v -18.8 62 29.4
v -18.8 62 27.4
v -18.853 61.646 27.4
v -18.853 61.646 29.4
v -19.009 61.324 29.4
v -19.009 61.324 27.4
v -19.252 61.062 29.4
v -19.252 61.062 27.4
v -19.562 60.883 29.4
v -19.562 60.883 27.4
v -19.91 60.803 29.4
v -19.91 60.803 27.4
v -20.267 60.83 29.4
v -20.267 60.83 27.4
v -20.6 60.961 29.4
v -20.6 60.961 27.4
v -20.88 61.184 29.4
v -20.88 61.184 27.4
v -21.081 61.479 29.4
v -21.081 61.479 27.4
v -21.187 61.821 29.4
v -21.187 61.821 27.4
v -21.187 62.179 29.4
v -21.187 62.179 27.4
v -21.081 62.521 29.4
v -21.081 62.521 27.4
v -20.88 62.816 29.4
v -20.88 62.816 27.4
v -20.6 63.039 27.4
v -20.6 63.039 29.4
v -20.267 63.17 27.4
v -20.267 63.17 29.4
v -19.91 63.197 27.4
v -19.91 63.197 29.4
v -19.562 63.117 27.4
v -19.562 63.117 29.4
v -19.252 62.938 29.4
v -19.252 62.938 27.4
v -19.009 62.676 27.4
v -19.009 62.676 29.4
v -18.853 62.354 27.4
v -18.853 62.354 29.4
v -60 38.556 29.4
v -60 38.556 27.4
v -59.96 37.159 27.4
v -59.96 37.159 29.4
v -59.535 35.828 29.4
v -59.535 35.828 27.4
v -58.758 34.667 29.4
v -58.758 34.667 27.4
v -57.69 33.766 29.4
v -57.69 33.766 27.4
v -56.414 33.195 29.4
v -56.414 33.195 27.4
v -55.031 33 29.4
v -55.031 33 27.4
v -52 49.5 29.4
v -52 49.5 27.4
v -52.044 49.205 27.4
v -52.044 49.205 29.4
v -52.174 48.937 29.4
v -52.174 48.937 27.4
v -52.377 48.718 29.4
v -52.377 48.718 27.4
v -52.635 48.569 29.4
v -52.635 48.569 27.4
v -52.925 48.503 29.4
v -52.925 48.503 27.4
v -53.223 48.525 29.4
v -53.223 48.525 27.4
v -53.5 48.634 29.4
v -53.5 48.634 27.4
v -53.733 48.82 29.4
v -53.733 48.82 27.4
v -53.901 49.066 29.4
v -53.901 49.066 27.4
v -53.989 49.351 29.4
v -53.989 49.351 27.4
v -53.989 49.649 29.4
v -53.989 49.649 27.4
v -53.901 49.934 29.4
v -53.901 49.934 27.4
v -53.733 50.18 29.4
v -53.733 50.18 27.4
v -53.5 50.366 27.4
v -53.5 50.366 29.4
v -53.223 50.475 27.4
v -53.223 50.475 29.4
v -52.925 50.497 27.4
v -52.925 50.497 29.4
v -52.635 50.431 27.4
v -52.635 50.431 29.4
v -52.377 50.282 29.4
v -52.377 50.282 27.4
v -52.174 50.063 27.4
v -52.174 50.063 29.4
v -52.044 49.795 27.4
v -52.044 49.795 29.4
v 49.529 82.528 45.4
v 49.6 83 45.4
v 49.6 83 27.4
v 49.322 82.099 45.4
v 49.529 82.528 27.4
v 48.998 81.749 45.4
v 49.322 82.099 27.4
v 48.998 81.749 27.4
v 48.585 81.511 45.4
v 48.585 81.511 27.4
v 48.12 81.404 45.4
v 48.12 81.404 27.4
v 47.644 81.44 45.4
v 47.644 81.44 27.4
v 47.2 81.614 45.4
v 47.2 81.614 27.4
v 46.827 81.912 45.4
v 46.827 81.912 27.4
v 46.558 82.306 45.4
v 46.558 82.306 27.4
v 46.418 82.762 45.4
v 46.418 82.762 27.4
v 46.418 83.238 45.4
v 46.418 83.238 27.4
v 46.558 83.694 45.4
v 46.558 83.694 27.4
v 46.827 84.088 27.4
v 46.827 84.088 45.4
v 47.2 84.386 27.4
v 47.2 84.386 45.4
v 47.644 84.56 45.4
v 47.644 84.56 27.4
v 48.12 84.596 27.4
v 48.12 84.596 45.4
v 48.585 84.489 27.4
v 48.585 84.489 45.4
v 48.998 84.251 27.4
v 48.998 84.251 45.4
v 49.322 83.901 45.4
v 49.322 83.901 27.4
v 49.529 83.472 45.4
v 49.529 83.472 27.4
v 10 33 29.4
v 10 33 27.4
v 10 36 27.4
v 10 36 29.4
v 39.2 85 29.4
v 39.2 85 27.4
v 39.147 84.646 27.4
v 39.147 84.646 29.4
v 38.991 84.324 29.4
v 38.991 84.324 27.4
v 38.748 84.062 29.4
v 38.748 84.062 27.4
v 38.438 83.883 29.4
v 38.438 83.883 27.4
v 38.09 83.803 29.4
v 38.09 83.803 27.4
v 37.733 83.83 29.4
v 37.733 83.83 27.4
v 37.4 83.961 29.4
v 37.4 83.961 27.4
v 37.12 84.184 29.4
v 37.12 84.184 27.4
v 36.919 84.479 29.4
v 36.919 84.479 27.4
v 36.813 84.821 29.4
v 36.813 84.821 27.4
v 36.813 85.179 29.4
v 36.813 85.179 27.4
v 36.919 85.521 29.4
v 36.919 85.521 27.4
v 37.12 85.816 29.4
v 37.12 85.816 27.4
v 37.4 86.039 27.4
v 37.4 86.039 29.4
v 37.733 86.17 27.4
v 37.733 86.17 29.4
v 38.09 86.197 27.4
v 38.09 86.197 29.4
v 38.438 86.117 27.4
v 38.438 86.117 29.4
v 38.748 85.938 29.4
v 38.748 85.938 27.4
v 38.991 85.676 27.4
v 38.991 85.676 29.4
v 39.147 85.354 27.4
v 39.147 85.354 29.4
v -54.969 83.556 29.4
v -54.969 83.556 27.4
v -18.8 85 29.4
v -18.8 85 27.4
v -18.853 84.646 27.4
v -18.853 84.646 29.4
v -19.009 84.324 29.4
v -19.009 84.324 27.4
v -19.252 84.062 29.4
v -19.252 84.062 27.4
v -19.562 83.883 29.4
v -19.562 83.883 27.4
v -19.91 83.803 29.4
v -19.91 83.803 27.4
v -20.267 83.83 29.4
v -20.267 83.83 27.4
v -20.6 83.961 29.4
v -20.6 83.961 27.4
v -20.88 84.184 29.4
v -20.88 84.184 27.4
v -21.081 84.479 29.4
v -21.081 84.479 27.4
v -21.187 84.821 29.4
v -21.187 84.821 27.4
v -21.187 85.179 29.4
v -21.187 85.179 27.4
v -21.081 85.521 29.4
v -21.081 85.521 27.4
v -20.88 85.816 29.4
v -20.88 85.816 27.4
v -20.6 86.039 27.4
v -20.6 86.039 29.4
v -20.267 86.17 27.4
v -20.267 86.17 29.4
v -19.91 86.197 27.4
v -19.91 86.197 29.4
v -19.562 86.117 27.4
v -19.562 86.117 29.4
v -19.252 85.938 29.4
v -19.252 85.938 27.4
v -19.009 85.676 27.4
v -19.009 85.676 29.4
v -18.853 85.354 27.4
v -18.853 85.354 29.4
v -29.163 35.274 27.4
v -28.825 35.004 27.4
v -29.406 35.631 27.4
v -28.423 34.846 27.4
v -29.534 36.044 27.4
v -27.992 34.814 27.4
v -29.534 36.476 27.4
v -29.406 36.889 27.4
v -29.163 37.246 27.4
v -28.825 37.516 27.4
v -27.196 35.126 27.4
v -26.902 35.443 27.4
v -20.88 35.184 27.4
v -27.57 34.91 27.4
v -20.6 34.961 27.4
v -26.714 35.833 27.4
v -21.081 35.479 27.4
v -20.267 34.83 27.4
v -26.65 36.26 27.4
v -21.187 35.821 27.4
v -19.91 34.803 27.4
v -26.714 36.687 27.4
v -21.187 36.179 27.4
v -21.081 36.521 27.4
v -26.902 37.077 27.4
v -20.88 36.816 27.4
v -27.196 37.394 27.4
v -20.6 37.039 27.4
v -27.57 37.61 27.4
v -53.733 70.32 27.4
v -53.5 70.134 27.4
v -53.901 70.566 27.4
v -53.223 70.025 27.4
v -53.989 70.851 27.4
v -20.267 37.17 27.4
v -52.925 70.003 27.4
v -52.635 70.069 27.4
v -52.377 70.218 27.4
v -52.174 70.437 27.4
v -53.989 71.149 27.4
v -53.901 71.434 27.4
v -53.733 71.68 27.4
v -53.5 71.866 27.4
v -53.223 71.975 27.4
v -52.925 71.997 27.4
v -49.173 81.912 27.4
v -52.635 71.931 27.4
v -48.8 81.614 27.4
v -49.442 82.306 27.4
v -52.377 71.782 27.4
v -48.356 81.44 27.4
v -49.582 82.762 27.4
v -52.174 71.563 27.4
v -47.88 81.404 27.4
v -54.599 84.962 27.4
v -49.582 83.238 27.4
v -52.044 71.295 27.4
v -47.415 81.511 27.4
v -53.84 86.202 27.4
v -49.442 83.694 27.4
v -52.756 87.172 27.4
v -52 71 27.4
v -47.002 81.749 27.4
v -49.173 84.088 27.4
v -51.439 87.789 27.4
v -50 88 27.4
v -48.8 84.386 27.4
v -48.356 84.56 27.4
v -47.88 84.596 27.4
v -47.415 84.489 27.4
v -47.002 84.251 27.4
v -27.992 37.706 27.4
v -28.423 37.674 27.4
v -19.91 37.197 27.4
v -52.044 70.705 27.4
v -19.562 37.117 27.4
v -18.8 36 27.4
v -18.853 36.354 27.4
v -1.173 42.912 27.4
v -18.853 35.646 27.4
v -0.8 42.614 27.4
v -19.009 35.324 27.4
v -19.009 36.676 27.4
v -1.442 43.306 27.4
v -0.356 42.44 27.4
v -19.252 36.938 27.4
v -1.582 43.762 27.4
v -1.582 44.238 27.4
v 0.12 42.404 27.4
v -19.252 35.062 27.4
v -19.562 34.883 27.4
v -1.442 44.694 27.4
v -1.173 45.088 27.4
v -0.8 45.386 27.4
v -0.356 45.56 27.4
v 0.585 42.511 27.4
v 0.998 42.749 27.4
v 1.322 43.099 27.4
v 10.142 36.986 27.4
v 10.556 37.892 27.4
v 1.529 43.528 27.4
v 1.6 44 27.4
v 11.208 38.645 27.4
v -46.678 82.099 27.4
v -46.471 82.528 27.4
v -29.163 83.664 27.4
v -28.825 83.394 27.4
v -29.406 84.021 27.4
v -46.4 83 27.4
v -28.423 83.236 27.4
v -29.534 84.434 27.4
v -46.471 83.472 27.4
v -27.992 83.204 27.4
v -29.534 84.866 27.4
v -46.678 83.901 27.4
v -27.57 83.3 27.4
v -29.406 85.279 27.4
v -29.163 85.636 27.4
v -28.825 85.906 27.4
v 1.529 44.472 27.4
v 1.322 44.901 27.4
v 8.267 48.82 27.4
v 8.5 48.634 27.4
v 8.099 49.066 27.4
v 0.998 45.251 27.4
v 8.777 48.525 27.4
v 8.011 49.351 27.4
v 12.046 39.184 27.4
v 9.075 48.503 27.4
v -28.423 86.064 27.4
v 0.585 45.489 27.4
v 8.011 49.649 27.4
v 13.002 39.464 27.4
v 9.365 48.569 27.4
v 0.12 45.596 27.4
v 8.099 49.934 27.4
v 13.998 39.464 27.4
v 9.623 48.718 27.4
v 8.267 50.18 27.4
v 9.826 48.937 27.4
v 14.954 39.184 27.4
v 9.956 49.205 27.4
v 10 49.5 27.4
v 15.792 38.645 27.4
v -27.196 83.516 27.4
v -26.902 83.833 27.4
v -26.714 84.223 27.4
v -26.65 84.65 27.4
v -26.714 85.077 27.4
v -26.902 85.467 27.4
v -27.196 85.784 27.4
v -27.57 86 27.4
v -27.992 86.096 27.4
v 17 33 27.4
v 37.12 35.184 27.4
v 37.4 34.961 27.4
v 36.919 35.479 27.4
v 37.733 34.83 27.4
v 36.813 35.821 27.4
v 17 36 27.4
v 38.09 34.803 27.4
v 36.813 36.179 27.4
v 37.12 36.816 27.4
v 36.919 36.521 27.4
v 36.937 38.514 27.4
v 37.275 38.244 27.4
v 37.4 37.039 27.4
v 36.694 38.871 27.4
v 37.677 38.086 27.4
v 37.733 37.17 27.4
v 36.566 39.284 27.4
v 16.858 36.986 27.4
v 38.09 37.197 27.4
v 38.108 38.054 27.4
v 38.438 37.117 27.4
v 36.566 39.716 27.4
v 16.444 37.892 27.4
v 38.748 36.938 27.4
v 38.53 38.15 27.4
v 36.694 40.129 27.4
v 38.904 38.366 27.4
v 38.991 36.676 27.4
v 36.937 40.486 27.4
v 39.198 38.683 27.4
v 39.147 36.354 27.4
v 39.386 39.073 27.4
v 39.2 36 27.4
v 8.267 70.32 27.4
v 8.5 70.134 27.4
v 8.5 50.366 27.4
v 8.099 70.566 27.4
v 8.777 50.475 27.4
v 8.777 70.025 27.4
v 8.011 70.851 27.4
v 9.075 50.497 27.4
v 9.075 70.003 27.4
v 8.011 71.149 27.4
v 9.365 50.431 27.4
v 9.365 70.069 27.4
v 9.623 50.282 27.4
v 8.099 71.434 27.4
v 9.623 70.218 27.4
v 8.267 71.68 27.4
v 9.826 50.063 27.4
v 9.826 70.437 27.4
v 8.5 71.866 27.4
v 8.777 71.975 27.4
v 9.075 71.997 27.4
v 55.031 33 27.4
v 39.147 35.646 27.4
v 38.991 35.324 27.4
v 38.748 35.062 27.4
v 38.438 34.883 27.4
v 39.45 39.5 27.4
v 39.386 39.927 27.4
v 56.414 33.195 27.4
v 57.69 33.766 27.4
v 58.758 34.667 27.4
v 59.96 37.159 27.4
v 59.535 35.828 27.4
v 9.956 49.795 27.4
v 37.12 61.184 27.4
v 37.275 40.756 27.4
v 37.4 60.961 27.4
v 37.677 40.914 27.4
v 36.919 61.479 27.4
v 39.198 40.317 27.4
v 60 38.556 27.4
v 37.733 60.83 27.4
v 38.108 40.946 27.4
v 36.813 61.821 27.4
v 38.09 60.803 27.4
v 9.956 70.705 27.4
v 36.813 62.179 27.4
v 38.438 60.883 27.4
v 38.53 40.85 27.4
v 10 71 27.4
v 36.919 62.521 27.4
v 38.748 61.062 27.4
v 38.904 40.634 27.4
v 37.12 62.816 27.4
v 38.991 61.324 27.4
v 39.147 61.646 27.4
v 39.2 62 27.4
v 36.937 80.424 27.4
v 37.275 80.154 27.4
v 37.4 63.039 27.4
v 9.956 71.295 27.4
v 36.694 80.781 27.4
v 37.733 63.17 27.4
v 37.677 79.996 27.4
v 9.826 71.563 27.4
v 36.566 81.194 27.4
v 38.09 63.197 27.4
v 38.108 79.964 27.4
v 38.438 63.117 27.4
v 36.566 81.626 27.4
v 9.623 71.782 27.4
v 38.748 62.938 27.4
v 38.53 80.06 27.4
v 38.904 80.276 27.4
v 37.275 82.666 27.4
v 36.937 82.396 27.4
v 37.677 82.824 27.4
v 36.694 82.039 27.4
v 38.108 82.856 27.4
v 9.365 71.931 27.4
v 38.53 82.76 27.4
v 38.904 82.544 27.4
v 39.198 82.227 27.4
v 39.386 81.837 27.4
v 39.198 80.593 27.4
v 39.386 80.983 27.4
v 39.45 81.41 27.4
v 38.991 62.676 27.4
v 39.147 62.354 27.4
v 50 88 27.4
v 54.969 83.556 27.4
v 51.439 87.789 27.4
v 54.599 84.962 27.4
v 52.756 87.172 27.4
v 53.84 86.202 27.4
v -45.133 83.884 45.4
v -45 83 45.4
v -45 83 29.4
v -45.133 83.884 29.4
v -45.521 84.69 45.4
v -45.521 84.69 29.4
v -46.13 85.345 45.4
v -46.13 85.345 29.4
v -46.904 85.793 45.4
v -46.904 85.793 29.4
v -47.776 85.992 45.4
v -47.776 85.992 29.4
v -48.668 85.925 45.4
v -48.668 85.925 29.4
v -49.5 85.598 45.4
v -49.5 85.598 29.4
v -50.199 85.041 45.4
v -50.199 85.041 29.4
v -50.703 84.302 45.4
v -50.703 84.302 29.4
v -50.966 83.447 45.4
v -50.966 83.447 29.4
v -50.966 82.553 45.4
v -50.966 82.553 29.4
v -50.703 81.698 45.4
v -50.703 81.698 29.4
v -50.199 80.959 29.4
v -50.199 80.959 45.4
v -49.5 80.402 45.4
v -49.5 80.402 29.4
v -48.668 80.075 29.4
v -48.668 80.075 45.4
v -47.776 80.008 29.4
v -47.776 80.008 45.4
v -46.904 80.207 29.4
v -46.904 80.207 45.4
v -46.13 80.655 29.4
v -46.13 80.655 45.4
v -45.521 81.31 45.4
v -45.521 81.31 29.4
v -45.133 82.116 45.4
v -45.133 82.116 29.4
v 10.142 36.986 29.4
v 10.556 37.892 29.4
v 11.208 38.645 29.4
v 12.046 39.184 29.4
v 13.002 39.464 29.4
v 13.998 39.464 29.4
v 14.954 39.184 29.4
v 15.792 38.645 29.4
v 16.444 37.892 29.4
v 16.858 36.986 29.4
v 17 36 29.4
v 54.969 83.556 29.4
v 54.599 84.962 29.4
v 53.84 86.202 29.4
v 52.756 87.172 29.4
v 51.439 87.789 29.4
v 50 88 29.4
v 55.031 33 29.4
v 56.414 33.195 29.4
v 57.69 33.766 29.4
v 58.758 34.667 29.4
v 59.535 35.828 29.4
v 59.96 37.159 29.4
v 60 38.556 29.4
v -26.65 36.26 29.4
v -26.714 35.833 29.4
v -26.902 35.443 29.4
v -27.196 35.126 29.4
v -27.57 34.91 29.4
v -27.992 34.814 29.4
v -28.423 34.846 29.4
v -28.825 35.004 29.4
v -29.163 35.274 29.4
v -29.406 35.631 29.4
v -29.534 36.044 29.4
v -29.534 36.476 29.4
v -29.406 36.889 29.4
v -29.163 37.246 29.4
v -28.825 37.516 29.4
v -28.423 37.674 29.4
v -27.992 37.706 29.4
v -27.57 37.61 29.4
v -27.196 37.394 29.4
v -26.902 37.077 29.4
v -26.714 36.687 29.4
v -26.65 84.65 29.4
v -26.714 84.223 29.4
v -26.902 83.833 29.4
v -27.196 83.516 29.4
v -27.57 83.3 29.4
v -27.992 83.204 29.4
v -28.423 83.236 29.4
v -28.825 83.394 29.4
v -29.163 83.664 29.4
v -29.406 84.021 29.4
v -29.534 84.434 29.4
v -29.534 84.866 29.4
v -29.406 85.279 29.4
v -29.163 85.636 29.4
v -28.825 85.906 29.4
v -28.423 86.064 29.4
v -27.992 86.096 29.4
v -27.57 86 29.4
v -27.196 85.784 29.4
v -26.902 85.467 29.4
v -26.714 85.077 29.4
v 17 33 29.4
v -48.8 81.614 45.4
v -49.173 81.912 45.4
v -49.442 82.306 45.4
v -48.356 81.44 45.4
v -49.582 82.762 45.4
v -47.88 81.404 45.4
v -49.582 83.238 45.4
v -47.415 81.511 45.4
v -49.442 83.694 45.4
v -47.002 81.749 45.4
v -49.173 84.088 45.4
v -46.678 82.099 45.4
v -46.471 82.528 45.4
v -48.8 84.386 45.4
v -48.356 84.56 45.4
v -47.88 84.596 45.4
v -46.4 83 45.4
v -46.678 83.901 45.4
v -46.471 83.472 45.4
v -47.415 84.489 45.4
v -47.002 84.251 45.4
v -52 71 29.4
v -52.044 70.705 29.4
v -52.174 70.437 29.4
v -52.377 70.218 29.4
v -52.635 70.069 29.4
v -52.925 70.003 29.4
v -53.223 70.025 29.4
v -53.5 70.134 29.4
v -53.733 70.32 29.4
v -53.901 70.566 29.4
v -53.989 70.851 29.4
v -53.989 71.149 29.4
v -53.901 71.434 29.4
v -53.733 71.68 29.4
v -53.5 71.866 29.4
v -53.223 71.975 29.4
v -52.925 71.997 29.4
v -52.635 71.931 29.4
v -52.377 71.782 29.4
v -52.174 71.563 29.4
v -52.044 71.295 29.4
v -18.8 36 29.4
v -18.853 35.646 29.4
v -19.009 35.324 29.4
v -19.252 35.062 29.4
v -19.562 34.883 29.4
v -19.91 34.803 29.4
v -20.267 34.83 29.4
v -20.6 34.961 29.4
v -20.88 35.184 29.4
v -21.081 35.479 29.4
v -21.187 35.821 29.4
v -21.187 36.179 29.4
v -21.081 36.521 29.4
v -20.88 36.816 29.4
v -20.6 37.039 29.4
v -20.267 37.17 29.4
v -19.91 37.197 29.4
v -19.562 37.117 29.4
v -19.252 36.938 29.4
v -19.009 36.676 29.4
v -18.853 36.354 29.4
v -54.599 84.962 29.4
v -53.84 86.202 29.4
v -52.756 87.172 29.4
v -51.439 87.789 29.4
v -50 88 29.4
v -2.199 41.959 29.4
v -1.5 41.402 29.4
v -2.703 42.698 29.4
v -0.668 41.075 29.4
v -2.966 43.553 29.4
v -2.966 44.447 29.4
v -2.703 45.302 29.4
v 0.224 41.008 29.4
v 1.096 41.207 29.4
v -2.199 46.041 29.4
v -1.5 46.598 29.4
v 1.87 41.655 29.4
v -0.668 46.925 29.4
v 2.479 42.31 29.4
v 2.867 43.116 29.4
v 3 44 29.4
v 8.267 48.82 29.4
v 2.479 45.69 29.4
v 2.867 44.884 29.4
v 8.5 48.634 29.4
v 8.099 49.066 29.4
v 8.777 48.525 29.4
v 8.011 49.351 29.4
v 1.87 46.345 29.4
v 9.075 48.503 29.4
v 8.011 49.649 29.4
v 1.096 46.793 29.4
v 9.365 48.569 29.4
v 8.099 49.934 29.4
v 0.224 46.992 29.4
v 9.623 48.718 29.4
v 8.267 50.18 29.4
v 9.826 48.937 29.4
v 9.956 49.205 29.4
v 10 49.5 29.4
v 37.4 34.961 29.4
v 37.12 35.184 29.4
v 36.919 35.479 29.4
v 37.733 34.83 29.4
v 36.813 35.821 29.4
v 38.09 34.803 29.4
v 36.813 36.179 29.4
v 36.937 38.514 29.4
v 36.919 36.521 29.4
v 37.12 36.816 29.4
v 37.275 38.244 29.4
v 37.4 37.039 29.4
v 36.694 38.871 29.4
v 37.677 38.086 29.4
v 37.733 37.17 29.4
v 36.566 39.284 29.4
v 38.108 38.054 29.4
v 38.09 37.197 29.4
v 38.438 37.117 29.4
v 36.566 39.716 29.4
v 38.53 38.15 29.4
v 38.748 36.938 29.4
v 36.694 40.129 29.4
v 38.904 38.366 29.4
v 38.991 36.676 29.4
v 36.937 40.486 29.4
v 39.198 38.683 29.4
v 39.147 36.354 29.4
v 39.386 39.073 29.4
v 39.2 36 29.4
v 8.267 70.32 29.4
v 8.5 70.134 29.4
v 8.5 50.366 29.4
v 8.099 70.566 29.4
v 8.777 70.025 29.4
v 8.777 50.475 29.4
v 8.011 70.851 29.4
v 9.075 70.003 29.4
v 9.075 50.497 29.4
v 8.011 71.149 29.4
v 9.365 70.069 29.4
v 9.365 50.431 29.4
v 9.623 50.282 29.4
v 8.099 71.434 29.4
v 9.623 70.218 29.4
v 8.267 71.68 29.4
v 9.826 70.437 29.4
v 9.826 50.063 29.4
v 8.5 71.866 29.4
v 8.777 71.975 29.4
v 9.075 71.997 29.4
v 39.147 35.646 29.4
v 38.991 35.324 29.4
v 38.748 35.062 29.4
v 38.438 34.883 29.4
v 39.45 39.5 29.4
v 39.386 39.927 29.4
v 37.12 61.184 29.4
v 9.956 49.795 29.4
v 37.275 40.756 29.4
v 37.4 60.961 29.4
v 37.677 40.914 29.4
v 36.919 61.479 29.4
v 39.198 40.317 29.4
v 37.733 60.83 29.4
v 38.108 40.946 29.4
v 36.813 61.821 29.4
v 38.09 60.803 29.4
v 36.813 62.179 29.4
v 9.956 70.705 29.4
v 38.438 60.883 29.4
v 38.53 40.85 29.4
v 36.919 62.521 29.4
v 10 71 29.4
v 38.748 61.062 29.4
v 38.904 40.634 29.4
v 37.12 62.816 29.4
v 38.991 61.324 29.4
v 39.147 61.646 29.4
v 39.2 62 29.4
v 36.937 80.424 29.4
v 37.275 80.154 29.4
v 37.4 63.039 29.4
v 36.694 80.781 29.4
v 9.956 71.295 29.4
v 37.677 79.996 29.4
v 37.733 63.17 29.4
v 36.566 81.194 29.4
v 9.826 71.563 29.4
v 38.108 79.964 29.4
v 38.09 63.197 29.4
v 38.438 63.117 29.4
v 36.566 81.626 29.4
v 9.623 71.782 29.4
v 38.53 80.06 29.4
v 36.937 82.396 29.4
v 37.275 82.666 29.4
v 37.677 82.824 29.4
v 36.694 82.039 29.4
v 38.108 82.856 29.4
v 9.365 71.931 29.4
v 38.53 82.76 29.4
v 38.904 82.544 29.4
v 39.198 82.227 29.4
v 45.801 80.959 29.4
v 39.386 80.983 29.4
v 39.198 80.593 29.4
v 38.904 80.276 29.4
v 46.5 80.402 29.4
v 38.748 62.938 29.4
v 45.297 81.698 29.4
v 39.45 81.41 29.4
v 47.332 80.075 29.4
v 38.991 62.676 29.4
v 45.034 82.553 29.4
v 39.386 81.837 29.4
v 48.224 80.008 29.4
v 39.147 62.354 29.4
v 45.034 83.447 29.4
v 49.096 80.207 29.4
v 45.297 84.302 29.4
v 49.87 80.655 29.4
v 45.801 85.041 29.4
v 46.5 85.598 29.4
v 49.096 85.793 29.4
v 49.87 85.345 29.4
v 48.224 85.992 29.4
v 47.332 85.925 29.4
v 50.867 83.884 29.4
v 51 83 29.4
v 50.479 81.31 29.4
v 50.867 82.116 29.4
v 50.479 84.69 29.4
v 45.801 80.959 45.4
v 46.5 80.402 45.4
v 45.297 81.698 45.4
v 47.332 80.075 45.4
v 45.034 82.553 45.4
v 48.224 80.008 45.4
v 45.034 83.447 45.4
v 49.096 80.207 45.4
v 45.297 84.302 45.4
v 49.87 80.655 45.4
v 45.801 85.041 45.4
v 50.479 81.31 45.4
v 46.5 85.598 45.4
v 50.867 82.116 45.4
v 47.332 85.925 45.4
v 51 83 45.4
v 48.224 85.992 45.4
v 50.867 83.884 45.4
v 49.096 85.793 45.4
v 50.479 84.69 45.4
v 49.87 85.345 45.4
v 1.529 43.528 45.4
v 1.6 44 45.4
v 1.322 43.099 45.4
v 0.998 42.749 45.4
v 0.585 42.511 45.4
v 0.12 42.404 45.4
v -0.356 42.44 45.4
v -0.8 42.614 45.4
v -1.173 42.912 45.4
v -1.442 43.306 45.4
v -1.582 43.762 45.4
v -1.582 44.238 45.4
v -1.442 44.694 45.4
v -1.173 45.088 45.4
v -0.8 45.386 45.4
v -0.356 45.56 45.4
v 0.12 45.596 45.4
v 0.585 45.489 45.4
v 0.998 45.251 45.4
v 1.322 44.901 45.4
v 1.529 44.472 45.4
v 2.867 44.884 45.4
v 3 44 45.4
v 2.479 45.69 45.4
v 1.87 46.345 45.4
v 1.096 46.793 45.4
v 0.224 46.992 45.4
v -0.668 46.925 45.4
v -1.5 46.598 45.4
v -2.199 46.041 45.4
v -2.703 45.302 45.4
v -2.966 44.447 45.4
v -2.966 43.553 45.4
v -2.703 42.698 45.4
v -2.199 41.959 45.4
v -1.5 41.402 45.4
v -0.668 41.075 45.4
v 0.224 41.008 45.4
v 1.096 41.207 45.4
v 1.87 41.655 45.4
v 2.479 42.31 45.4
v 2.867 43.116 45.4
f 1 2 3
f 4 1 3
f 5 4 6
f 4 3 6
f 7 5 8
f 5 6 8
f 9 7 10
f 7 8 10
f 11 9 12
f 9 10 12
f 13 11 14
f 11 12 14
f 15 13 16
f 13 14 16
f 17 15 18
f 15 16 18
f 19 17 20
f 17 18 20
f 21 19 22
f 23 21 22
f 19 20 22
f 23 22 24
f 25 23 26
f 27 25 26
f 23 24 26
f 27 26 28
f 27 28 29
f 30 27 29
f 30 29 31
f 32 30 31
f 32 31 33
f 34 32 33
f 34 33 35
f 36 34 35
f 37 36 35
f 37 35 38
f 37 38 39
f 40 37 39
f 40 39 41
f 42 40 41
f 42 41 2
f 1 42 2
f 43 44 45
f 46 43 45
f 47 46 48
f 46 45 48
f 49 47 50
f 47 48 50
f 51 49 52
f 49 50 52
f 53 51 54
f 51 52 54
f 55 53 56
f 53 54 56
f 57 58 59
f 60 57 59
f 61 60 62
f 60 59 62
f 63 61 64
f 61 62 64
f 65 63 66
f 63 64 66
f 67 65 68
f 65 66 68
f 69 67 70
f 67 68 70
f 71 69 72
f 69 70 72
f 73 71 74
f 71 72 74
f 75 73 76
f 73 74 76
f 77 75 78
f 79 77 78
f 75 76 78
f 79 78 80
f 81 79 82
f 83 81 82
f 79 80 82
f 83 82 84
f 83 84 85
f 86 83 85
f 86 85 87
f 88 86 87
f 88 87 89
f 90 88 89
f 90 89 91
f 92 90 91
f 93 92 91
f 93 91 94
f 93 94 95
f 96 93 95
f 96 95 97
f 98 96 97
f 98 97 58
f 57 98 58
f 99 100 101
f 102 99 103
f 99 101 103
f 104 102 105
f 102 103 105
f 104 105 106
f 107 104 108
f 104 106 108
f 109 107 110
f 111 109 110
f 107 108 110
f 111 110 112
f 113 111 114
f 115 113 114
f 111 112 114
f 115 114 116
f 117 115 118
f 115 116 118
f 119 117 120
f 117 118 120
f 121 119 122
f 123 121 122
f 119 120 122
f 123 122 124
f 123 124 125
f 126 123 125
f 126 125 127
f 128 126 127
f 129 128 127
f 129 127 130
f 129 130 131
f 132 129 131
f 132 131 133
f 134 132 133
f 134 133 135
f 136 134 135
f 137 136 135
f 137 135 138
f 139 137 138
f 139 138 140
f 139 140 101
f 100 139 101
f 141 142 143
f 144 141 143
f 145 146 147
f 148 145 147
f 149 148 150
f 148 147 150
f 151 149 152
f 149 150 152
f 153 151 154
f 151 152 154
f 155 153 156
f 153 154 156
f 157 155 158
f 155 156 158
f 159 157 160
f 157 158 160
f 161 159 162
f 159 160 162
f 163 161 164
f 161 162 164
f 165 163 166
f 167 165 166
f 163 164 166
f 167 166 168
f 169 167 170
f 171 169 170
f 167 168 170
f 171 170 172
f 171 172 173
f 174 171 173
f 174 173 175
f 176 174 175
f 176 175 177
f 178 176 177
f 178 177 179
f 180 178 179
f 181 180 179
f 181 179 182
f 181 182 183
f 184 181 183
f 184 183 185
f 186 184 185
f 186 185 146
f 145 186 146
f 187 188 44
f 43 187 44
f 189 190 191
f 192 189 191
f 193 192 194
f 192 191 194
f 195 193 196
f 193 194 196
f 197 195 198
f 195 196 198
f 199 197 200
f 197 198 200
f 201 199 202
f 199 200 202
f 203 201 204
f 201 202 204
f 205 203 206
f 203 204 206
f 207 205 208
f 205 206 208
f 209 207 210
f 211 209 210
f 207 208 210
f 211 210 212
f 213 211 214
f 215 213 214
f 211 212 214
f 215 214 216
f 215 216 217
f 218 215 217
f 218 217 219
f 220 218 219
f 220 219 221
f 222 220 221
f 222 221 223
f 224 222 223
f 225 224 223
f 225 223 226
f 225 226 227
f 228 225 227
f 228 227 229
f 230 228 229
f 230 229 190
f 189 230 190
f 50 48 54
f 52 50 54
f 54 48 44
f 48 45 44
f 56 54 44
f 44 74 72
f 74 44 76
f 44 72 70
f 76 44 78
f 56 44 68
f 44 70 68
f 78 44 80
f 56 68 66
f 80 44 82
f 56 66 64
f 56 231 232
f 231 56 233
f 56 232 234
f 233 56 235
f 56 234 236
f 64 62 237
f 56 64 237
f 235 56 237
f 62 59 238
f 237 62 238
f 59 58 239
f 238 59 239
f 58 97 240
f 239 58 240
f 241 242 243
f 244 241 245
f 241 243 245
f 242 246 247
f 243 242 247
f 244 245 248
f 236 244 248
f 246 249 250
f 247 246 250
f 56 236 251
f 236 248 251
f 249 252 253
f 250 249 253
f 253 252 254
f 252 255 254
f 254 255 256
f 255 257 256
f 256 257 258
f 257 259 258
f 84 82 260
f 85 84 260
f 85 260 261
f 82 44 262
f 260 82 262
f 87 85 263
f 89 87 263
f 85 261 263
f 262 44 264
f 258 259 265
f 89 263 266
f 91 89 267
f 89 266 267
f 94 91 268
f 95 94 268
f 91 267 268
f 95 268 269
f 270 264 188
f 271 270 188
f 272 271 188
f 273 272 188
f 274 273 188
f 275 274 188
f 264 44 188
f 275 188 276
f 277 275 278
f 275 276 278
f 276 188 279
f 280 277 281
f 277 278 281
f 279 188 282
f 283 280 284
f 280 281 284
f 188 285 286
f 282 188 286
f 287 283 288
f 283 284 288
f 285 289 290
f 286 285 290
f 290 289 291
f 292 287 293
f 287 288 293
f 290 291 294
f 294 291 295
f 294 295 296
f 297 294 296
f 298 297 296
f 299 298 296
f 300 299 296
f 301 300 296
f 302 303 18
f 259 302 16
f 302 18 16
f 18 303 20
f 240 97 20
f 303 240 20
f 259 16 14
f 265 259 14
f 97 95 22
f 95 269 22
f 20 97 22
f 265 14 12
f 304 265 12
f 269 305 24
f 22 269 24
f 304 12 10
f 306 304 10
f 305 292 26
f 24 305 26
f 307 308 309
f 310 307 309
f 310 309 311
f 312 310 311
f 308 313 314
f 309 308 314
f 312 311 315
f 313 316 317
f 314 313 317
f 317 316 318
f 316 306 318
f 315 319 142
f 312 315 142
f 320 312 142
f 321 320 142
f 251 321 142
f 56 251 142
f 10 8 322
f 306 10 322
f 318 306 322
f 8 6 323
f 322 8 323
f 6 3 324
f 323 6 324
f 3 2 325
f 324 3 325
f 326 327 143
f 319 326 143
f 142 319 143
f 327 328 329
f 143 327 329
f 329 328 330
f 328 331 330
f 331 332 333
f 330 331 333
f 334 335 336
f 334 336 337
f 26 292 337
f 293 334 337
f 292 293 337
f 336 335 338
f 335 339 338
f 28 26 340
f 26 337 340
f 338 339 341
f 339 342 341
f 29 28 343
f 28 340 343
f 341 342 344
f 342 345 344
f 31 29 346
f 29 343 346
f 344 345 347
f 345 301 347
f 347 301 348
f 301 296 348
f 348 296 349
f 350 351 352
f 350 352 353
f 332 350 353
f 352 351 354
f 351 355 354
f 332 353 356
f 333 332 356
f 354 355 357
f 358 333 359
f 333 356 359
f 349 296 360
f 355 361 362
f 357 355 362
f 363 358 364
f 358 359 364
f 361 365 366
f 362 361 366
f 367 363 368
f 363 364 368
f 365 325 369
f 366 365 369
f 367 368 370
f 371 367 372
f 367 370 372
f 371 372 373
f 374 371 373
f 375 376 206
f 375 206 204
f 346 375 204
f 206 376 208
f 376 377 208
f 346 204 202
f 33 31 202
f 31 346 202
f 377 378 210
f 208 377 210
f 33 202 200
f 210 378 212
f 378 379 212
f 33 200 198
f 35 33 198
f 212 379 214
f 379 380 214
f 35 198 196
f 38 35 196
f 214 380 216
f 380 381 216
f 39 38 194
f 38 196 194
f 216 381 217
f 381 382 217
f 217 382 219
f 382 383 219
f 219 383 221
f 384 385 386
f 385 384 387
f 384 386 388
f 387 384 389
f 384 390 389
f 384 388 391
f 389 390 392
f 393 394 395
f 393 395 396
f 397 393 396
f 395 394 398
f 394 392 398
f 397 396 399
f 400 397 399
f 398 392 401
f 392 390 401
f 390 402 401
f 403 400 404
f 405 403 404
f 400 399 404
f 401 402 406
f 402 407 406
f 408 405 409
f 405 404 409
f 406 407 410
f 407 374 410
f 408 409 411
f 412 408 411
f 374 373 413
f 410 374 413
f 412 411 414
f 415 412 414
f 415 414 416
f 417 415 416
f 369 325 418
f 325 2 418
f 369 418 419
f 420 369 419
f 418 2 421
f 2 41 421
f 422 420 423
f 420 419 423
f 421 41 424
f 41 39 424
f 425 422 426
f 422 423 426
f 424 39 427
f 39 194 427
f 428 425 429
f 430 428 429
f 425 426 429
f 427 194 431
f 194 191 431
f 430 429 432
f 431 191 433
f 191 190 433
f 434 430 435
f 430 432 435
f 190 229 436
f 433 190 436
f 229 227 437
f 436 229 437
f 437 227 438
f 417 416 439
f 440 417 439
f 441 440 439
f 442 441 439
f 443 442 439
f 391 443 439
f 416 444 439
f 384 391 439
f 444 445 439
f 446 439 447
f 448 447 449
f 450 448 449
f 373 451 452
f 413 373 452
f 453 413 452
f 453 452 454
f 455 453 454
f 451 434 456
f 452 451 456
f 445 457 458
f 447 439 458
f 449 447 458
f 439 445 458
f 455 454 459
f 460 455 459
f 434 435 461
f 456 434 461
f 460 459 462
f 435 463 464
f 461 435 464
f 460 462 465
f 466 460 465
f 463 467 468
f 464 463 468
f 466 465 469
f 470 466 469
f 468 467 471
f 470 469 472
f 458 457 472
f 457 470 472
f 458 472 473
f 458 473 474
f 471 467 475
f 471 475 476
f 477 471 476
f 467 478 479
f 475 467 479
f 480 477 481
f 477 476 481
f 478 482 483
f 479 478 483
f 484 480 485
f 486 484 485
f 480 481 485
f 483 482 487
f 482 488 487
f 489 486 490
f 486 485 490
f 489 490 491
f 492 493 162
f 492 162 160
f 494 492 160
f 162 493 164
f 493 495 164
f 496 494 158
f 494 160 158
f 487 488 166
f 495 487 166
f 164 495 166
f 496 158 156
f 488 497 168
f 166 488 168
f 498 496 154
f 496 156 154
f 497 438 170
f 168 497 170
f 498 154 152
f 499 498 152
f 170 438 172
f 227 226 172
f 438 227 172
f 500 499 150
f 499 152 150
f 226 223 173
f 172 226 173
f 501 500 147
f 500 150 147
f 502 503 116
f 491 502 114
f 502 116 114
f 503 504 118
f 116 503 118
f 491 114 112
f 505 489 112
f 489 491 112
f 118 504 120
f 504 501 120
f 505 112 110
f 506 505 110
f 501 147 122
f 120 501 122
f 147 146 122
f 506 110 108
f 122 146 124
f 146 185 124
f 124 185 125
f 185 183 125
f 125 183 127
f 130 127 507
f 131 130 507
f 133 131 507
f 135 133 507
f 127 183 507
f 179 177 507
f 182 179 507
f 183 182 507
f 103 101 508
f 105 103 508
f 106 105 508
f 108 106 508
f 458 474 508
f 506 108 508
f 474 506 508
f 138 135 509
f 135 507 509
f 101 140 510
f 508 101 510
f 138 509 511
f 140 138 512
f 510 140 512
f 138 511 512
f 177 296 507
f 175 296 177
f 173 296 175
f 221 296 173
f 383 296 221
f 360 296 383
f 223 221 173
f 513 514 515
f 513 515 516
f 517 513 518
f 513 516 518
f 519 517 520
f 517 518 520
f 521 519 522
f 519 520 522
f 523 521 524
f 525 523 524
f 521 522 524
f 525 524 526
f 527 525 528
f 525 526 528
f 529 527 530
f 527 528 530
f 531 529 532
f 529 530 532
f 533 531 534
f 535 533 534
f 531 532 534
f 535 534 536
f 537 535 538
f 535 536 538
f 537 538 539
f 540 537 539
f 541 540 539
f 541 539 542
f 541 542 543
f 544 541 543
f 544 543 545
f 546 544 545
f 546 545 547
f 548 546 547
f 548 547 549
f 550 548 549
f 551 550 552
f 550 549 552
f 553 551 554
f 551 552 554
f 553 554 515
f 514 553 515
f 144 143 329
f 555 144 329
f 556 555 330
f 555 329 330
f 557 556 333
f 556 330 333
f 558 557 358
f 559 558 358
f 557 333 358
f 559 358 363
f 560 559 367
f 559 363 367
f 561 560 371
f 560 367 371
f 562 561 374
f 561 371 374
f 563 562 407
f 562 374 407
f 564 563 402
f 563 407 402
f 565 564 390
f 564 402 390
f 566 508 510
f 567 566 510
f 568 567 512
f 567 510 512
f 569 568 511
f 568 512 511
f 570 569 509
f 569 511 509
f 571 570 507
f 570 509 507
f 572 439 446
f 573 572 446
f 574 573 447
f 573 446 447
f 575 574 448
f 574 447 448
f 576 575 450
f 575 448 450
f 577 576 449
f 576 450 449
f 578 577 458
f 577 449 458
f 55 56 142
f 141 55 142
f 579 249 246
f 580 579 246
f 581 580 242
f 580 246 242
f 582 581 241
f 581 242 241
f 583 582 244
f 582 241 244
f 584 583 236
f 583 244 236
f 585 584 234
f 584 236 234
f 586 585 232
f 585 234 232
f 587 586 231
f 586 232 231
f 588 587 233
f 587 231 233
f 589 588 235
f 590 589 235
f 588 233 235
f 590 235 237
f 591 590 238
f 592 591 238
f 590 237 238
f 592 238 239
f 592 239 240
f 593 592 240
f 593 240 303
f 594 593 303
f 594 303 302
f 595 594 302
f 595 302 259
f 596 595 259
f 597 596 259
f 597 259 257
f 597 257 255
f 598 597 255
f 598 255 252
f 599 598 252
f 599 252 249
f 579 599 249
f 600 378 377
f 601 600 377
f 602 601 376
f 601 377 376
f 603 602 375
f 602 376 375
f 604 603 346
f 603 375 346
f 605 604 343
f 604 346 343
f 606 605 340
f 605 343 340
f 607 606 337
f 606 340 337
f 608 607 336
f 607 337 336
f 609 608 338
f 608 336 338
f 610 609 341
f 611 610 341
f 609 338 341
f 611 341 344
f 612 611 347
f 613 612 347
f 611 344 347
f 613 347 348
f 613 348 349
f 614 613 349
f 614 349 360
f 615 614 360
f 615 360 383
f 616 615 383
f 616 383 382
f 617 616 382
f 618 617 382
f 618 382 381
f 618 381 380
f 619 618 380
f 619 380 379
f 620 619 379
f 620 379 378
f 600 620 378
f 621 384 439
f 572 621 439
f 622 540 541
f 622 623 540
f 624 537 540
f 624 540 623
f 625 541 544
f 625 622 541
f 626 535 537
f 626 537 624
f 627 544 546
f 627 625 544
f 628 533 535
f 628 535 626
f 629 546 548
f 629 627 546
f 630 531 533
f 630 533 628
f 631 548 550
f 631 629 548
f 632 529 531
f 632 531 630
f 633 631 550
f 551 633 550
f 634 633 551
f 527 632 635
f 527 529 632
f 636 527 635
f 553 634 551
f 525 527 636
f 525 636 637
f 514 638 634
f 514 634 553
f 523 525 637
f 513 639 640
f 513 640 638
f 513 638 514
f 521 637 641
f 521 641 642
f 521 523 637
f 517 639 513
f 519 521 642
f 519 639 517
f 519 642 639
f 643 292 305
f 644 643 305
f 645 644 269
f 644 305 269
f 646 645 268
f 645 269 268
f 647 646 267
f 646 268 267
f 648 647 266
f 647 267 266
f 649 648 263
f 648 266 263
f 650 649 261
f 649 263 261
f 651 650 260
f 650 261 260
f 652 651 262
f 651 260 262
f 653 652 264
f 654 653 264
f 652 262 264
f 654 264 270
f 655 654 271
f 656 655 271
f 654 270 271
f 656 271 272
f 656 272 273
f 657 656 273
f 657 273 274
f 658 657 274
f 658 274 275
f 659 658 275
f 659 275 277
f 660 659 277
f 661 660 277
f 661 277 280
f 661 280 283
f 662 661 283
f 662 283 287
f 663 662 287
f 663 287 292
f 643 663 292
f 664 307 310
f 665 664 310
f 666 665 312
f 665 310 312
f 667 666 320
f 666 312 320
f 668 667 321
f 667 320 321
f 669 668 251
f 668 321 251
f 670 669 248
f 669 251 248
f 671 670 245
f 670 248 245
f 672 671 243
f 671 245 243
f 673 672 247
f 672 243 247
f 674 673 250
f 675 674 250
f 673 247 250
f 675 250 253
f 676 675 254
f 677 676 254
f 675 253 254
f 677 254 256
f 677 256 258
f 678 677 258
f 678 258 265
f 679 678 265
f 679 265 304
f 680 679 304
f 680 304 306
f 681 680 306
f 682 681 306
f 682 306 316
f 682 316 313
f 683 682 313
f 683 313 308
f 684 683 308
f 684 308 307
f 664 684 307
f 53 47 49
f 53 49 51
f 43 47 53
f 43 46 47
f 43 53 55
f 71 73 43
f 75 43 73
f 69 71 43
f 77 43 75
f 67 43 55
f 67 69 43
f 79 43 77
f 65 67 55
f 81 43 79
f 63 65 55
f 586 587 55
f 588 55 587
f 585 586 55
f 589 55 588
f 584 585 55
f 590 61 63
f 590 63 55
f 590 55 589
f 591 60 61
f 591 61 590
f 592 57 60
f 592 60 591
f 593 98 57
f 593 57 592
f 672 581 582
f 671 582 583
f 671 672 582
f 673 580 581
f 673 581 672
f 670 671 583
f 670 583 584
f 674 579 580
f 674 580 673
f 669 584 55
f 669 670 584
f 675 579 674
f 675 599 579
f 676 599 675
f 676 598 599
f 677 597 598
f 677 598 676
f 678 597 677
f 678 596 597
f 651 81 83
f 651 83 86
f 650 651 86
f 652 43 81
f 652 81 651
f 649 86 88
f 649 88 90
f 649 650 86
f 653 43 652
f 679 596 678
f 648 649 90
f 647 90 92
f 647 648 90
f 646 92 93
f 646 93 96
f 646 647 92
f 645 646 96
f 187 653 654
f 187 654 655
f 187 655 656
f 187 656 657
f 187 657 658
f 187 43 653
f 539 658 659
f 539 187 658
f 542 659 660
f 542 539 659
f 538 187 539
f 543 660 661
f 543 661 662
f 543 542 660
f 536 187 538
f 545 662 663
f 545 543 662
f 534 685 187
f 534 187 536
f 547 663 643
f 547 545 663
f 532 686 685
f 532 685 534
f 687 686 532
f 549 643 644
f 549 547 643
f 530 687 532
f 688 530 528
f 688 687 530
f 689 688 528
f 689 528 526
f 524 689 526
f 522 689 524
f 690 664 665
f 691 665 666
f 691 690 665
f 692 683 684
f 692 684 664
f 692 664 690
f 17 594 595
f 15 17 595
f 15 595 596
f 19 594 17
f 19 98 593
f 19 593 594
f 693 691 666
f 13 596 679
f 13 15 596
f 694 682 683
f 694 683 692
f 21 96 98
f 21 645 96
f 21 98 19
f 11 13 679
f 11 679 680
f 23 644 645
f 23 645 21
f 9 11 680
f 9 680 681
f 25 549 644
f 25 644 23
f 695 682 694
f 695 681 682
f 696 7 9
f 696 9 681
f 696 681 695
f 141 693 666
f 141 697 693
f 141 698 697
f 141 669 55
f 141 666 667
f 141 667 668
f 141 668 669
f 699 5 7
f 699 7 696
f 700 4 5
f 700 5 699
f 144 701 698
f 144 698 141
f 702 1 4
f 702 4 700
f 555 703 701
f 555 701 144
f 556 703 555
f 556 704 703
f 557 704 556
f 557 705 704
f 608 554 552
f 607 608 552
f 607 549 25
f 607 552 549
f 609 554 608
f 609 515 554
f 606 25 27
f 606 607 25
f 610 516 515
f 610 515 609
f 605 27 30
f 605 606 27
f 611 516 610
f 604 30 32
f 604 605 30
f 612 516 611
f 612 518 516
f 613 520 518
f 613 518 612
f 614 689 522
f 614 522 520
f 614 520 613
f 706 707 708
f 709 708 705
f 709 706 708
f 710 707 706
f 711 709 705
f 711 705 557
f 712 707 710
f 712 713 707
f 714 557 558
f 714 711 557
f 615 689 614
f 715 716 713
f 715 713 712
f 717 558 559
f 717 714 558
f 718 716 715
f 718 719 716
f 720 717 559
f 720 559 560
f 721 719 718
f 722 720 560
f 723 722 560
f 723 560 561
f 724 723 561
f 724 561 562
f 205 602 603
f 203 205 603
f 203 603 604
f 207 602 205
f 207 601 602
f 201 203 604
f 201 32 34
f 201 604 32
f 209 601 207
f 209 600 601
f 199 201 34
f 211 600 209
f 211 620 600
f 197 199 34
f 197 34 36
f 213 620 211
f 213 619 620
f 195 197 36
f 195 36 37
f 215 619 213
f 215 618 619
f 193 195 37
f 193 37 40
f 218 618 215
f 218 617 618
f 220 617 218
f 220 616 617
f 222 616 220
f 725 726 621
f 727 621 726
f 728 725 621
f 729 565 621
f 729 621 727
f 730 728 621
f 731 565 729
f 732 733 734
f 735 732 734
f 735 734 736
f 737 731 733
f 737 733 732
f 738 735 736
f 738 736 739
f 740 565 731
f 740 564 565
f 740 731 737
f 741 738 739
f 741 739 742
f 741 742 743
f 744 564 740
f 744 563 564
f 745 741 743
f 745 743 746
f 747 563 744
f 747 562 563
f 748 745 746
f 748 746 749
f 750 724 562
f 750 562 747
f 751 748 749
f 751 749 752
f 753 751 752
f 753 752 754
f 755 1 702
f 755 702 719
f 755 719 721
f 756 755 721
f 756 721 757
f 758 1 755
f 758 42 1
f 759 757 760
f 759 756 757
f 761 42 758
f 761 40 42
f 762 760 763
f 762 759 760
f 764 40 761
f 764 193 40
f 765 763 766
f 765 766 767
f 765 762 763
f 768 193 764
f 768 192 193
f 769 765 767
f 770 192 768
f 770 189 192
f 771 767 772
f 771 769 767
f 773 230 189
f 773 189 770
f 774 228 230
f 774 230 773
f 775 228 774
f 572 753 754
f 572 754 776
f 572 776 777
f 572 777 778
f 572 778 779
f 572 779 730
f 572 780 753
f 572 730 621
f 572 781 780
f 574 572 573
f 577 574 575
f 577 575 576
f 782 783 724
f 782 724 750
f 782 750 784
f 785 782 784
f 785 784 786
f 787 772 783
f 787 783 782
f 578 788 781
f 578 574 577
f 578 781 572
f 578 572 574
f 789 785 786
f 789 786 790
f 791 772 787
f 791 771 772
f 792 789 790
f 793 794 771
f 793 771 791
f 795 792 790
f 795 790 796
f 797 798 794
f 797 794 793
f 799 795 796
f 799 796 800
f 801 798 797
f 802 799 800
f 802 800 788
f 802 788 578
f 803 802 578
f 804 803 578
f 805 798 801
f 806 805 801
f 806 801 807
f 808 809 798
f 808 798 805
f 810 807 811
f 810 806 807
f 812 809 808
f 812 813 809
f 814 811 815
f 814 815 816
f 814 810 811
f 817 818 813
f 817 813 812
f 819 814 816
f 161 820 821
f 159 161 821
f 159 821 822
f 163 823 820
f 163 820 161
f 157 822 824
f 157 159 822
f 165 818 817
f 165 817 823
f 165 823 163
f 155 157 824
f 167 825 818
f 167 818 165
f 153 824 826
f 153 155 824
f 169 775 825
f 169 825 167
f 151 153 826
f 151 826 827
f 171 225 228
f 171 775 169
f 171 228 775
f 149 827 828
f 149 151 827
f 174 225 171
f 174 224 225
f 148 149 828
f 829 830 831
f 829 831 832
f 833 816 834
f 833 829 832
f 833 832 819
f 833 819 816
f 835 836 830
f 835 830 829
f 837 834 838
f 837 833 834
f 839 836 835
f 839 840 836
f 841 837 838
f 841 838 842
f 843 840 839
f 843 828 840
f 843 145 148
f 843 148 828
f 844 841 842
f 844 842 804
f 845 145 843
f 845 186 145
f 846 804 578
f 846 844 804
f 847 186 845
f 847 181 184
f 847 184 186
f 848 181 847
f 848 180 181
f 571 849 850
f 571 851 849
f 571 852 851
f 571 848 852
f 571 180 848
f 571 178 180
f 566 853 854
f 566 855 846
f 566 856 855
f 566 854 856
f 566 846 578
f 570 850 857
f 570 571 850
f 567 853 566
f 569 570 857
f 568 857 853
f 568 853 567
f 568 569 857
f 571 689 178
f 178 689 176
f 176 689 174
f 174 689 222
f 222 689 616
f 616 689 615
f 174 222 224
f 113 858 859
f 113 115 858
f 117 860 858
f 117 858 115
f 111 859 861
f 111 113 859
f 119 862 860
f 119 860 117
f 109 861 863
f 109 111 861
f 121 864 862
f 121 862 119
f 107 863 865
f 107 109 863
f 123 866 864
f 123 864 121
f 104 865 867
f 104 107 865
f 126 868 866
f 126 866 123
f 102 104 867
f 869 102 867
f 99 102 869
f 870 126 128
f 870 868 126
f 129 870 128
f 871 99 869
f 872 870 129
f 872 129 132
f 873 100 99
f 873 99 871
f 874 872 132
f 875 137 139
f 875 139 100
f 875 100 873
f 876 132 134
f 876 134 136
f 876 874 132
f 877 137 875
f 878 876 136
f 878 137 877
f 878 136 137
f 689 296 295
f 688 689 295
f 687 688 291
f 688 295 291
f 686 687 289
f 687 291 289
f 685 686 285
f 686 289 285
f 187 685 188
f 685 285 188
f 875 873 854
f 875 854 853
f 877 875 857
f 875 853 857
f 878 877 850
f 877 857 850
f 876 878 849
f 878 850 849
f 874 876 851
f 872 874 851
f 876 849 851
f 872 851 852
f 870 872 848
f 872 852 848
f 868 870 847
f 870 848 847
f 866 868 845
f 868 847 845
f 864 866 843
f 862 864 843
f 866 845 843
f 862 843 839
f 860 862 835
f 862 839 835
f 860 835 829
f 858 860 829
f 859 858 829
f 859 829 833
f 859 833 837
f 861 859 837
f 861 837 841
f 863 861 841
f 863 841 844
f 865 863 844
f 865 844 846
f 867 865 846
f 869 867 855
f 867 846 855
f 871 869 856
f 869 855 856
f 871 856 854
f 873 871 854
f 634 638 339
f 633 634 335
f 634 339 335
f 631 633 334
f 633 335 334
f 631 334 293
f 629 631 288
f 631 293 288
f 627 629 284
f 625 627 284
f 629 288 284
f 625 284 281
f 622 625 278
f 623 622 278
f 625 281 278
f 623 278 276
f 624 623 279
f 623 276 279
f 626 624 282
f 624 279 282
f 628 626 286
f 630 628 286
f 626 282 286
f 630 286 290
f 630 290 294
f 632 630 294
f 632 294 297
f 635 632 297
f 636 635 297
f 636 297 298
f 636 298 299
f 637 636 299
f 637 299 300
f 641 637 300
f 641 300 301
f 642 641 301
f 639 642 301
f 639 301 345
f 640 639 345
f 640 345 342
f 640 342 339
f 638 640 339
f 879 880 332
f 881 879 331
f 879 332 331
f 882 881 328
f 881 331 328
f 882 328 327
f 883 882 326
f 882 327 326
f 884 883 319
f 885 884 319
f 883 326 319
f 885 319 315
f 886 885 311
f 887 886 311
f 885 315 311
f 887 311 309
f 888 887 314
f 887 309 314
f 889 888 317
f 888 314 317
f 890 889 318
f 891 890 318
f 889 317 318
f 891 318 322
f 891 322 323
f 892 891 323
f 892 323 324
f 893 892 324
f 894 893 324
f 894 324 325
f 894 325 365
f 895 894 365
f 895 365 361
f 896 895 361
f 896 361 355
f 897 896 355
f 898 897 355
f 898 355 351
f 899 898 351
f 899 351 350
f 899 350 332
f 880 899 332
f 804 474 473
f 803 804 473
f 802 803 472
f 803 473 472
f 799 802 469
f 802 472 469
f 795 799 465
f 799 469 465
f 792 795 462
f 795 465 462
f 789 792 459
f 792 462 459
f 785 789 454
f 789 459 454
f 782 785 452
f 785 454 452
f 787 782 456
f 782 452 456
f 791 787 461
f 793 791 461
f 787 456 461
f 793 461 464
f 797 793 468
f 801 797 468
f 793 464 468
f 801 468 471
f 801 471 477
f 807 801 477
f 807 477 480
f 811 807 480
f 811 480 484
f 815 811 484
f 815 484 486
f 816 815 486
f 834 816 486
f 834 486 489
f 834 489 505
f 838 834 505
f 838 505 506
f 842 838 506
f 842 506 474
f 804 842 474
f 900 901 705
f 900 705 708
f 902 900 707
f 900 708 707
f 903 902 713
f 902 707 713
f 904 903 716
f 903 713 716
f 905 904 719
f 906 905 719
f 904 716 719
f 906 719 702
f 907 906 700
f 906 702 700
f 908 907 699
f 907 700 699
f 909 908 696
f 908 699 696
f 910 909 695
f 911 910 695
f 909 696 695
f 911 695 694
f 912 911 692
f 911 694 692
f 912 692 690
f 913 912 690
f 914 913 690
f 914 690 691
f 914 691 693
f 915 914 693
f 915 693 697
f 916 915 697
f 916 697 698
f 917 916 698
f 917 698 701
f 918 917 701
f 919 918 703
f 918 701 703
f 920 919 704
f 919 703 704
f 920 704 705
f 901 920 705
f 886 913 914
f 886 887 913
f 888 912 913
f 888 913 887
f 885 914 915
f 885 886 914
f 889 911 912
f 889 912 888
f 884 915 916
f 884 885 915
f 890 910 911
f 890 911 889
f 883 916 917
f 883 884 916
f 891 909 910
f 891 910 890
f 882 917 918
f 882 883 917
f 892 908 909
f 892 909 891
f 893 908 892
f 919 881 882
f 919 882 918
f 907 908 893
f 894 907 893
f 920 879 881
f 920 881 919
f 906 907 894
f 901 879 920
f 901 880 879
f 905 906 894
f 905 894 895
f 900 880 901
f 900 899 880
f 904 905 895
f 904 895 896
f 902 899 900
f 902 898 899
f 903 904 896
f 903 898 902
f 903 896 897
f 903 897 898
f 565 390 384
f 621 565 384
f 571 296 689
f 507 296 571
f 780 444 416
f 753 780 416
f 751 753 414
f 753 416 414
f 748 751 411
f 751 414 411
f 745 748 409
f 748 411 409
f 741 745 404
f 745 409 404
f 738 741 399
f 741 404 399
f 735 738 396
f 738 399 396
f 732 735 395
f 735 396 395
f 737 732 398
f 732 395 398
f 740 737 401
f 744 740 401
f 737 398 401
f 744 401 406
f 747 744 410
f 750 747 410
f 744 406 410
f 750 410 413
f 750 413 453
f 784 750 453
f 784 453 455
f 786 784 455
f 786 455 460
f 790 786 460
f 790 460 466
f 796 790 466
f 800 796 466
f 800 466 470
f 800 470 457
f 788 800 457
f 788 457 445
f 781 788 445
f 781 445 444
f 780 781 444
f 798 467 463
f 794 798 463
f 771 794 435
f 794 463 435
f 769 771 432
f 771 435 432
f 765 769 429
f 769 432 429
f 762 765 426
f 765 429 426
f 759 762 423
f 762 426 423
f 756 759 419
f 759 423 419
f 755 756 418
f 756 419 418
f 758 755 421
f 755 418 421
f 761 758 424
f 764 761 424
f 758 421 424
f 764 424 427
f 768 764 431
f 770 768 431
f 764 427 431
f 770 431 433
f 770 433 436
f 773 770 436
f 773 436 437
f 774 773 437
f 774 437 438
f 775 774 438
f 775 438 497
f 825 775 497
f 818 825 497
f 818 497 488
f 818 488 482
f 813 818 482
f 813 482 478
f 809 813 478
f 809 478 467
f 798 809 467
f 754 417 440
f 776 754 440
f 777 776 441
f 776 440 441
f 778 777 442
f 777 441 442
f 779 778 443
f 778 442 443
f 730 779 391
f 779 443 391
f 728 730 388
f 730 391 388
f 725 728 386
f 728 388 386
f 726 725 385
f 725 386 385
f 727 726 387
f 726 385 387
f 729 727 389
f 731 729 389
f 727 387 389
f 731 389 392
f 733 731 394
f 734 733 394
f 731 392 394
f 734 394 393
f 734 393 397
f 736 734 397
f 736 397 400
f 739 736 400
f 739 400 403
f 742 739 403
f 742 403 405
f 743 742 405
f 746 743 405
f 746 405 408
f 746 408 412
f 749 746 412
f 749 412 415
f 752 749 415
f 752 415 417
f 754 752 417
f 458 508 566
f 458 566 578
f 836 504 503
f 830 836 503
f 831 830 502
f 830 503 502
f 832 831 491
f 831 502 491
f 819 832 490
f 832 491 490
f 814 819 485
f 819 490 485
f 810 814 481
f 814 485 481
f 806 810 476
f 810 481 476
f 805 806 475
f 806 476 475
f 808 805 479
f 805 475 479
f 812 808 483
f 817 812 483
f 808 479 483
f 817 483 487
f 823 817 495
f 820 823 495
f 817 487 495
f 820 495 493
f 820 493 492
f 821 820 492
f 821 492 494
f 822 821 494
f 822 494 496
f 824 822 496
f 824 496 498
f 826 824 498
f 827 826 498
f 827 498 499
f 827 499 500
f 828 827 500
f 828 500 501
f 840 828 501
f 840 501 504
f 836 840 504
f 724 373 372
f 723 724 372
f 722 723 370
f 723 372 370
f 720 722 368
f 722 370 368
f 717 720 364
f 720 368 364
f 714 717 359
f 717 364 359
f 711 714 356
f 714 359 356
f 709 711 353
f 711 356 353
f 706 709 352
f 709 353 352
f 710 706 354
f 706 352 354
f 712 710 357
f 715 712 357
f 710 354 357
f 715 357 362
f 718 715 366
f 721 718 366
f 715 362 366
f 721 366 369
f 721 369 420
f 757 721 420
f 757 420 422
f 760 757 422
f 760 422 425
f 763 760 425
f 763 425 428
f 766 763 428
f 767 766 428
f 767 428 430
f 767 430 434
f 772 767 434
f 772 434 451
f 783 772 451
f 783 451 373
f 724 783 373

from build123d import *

# Parameters (mm, degrees)
PAD_DEPTH     = 2
SKETCH001_R   = 3
PAD001_DEPTH  = 16
SKETCH002_R   = 1.6
SKETCH002_R_2 = 1
SKETCH002_R_3 = 1.2
SKETCH002_R_4 = 1.45
POCKET_DEPTH  = 18.001


with BuildPart() as part:
    # Sketch → Pad (new body)
    with BuildSketch(Plane.XY):
        with BuildLine():
            ThreePointArc((-50, 44), (-53.333341, 42.726773), (-54.969042, 39.555534))
            Line((-54.969042, 39.555534), (-60, -5.444466))
            ThreePointArc((-60, -5.444466), (-58.75773, -9.333341), (-55.030958, -11))
            Line((-55.030958, -11), (55.030958, -11))
            ThreePointArc((55.030958, -11), (58.75773, -9.333341), (60, -5.444466))
            Line((54.969042, 39.555534), (60, -5.444466))
            ThreePointArc((54.969042, 39.555534), (53.333341, 42.726773), (50, 44))
            Line((-50, 44), (50, 44))
        make_face()
    extrude(amount=PAD_DEPTH)

    # Sketch001 → Pad001 (join)
    with BuildSketch(Plane.XY.offset(2)):
        Circle(SKETCH001_R)
        with Locations((-48, 39)):
            Circle(SKETCH001_R)
        with Locations((48, 39)):
            Circle(SKETCH001_R)
    extrude(amount=PAD001_DEPTH)

    # Sketch002 → Pocket (cut, through all)
    with BuildSketch(Plane(origin=(0, 0, 0), x_dir=(1, 0, 0), z_dir=(0, 0, -1))):
        Circle(SKETCH002_R)
        with Locations((-48, -39)):
            Circle(SKETCH002_R)
        with Locations((48, -39)):
            Circle(SKETCH002_R)
        with Locations((9, -5.5)):
            Circle(SKETCH002_R_2)
        with Locations((9, -27)):
            Circle(SKETCH002_R_2)
        with Locations((38, 8)):
            Circle(SKETCH002_R_3)
        with Locations((38, -41)):
            Circle(SKETCH002_R_3)
        with Locations((-20, -41)):
            Circle(SKETCH002_R_3)
        with Locations((-53, -27)):
            Circle(SKETCH002_R_2)
        with Locations((-53, -5.5)):
            Circle(SKETCH002_R_2)
        with Locations((-20, 8)):
            Circle(SKETCH002_R_3)
        with Locations((-28.1, 7.74)):
            Circle(SKETCH002_R_4)
        with Locations((38, 4.5)):
            Circle(SKETCH002_R_4)
        with Locations((-28.1, -40.65)):
            Circle(SKETCH002_R_4)
        with Locations((38, -37.41)):
            Circle(SKETCH002_R_4)
        with Locations((-20, -18)):
            Circle(SKETCH002_R_3)
        with Locations((38, -18)):
            Circle(SKETCH002_R_3)
        with BuildLine():
            ThreePointArc((17, 12), (13.5, 15.5), (10, 12))
            Line((10, 12), (10, 8))
            ThreePointArc((10, 8), (13.5, 4.5), (17, 8))
            Line((17, 8), (17, 12))
        make_face()
    extrude(amount=-POCKET_DEPTH, mode=Mode.SUBTRACT)


with BuildPart() as part_1:
    # Body placement: moved
    add(part.part.moved(Location((0, 44, 27.4))))


solid = part_1.part
